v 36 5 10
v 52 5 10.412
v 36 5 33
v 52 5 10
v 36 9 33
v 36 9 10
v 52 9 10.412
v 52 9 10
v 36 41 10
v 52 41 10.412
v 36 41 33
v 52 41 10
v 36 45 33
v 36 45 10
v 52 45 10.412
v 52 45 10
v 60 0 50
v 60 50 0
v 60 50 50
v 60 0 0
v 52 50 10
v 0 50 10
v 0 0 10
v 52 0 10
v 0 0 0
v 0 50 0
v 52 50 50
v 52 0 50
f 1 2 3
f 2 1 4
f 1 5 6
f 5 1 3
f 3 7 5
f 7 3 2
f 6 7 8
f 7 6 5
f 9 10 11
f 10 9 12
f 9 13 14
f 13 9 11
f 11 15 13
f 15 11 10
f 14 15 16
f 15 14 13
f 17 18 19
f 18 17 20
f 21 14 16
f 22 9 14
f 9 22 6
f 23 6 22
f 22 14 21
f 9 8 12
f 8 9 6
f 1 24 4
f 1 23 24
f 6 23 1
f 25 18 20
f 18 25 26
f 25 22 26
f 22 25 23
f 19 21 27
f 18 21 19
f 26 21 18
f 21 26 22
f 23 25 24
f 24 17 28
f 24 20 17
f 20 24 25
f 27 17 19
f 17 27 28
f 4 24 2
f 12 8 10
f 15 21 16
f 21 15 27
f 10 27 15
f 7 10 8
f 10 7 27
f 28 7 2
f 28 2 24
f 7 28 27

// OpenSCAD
$fn = 32;

// ----------------------------------------------------------------------
// Rib bracket: 2-gusset L bracket
// ----------------------------------------------------------------------

// --- parameters (mm) ---
base_l = 60;              // foot length, X
base_w = 50;              // foot width, Y
base_t = 10;              // foot thickness
plate_t = 8;              // upright plate thickness
plate_h = 50;             // overall height
gus_l = 16;               // gusset leg along the foot
gus_h = 24;               // gusset height
gus_t = 4;                // gusset thickness
gus_edge = 5;             // gusset margin from the foot edge
n_gus = 2;                // gusset count

gus_pitch = (base_w - 2 * gus_edge - gus_t) / (n_gus - 1);  // gusset pitch

union() {
  cube([base_l, base_w, base_t]);
  translate([base_l - plate_t, 0, base_t - 1])
    cube([plate_t, base_w, plate_h - base_t + 1]);
  for (i = [0 : n_gus - 1])
    translate([base_l - plate_t - gus_l, gus_edge + i * gus_pitch, base_t - 1])
      rotate([-90, 0, 0])
        linear_extrude(height = gus_t)
          polygon(points = [[0, 0], [gus_l + 1, 0], [0, -gus_h]]);
}
